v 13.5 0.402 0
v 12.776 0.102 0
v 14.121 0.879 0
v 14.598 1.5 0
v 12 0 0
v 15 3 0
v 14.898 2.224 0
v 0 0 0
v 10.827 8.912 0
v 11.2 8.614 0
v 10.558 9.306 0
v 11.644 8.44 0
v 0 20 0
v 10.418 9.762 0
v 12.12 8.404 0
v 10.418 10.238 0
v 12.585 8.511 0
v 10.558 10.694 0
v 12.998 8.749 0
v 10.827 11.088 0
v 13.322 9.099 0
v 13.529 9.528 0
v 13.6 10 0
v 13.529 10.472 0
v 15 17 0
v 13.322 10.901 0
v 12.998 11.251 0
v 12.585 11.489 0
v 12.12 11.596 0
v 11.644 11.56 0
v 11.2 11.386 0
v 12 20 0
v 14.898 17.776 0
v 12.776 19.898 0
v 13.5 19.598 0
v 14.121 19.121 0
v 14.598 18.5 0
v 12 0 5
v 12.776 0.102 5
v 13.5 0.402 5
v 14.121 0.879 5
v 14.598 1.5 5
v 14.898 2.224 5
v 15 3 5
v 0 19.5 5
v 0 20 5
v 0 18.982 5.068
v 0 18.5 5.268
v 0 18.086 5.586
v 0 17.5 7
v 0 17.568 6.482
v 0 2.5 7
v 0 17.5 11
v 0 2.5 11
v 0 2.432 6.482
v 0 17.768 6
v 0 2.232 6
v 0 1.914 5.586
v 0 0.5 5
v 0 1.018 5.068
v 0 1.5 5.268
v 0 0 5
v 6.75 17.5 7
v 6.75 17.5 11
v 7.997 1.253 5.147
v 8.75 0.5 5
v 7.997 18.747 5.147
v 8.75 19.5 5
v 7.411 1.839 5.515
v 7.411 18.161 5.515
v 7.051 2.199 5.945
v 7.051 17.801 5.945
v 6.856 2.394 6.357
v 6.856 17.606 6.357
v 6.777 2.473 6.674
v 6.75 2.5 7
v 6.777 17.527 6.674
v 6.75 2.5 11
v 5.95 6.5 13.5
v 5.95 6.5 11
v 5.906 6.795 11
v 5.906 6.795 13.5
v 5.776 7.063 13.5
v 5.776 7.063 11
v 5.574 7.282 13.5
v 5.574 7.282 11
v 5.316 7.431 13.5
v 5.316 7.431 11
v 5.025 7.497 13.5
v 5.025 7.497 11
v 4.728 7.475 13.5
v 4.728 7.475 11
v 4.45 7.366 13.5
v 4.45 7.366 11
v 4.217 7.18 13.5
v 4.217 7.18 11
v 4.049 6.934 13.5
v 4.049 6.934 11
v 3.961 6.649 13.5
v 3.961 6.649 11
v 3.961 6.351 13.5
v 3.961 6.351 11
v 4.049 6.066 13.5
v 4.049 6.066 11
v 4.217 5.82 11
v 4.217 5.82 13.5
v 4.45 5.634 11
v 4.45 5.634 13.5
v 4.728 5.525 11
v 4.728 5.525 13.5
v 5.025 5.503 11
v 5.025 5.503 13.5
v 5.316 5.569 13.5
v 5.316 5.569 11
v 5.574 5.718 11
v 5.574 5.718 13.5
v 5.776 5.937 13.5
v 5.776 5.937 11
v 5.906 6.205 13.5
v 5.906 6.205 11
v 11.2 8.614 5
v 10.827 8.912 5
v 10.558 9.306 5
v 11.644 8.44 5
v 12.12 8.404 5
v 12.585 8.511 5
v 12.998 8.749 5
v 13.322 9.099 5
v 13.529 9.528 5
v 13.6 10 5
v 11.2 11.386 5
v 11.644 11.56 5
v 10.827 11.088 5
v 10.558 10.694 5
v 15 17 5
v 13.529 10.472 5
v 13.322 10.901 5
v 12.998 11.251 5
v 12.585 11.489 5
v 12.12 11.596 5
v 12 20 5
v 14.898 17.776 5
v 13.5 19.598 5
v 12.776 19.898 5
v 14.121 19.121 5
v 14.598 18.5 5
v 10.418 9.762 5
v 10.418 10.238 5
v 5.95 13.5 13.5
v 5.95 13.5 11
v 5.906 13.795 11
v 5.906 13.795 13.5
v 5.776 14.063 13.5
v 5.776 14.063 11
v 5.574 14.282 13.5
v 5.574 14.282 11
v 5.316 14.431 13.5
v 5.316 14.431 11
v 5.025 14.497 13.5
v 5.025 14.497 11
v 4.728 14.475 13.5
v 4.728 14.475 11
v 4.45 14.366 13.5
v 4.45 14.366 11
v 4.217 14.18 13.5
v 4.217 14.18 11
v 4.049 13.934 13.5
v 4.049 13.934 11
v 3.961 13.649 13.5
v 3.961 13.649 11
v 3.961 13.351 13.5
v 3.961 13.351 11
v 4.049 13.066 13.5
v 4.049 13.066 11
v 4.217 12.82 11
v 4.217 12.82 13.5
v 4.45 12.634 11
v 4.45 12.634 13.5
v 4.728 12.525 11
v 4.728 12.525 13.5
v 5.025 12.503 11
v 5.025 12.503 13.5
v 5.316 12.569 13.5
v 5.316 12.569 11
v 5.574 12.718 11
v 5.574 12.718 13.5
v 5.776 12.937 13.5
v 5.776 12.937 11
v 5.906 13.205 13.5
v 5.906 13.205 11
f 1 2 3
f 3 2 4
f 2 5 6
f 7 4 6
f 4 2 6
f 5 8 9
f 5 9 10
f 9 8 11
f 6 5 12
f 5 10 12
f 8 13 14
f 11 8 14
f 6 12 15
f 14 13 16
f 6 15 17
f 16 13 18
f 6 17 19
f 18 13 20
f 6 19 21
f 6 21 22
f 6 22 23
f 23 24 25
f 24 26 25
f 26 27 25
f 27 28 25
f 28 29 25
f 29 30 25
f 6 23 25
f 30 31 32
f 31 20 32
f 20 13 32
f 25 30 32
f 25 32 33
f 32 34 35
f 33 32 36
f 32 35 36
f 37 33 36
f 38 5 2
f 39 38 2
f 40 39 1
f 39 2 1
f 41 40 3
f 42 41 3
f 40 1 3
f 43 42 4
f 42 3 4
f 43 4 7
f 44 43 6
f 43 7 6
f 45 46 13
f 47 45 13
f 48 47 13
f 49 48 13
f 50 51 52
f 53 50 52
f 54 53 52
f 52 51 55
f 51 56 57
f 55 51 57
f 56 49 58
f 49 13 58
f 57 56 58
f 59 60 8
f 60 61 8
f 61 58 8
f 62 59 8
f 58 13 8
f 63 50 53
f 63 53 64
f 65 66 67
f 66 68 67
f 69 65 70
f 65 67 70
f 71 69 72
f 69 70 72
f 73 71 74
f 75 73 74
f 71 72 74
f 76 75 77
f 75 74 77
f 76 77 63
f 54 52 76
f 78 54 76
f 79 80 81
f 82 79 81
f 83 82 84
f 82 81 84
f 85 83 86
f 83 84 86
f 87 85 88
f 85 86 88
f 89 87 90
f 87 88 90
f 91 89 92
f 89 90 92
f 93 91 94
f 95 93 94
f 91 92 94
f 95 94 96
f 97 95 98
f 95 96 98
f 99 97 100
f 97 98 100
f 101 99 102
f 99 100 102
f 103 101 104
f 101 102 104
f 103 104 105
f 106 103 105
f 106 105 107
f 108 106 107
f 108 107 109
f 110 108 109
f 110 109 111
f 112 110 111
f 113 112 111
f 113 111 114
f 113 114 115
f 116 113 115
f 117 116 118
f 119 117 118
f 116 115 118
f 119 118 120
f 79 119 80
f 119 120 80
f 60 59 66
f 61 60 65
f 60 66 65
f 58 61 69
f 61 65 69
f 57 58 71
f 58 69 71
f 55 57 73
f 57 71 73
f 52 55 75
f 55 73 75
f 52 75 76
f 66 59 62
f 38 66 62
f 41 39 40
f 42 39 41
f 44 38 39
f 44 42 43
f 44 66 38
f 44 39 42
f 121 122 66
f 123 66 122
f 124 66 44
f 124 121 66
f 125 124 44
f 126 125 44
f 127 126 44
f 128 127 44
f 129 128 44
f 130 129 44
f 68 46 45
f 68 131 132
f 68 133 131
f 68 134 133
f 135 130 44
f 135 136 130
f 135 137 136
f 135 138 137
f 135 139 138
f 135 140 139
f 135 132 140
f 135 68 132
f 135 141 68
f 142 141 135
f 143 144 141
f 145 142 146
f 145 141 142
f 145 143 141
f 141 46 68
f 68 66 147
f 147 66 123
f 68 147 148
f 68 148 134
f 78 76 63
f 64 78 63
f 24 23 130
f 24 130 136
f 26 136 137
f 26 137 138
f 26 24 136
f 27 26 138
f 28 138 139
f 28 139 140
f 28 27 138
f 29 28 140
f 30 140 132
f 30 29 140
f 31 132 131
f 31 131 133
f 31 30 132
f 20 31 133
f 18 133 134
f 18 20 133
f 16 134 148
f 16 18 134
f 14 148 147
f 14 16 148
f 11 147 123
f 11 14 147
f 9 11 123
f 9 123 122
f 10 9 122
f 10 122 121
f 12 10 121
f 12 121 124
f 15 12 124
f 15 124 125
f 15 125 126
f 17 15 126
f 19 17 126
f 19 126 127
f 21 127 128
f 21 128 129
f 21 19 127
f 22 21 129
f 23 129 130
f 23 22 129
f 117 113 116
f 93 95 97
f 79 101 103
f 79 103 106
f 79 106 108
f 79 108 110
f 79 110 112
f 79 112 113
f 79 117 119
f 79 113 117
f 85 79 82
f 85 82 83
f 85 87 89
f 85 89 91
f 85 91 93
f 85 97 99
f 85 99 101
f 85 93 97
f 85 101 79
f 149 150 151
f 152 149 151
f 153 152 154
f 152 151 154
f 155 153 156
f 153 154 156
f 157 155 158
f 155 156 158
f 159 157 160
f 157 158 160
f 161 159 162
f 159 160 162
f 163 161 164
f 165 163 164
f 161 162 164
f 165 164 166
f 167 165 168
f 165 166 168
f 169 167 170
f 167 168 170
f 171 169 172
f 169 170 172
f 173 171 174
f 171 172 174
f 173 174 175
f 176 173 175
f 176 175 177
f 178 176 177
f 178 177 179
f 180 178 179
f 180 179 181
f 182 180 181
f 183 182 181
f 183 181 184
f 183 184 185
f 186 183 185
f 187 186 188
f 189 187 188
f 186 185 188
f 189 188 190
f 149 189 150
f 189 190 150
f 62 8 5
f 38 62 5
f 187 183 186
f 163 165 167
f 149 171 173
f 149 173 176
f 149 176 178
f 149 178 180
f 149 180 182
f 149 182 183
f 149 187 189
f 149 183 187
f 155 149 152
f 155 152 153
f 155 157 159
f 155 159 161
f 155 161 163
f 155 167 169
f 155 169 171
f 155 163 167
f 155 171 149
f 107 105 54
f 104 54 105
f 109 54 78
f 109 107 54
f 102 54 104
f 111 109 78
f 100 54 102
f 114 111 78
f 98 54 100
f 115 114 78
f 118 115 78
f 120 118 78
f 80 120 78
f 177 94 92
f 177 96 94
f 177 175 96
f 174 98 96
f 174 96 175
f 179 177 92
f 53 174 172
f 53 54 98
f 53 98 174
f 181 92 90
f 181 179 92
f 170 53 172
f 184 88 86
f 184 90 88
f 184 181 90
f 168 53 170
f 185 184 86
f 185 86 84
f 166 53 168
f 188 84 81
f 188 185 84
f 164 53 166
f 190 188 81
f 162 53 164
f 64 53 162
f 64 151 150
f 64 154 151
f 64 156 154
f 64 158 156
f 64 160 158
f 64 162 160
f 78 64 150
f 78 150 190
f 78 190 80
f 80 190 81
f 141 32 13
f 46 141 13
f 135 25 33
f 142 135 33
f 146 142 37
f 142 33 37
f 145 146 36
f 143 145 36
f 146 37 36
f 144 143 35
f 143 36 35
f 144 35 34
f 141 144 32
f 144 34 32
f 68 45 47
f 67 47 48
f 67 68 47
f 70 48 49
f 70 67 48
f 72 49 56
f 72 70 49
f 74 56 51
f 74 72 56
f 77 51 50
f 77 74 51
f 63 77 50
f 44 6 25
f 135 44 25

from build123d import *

# Parameters (mm, degrees)
CROQUIS1_R              = 1.6
SALIENTE_EXTRUIR1_DEPTH = 5
CROQUIS2_W              = 6.75
CROQUIS2_H              = 15
SALIENTE_EXTRUIR2_DEPTH = 6
REDONDEO1_R             = 2
CROQUIS3_R              = 1
SALIENTE_EXTRUIR3_DEPTH = 2.5


with BuildPart() as part:
    # Croquis1 → Saliente-Extruir1 (new body)
    with BuildSketch(Plane.XY):
        with BuildLine():
            Line((0, 0), (12, 0))
            ThreePointArc((12, 0), (14.121320344, 0.878679656), (15, 3))
            Line((15, 3), (15, 17))
            ThreePointArc((15, 17), (14.121320344, 19.121320344), (12, 20))
            Line((12, 20), (0, 20))
            Line((0, 20), (0, 0))
        make_face()
        with Locations((12, 10)):
            Circle(CROQUIS1_R, mode=Mode.SUBTRACT)
    extrude(amount=SALIENTE_EXTRUIR1_DEPTH)

    # Croquis2 → Saliente-Extruir2 (add)
    with BuildSketch(Plane.XY.offset(5)):
        with Locations((3.375, 10)):
            Rectangle(CROQUIS2_W, CROQUIS2_H)
    extrude(amount=SALIENTE_EXTRUIR2_DEPTH)

    # Redondeo1
    redondeo1_edges = [part.edges().sort_by_distance(p)[0] for p in [
        (3.375, 2.5, 5),
        (6.75, 10, 5),
        (3.375, 17.5, 5),
    ]]
    fillet(redondeo1_edges, radius=REDONDEO1_R)

    # Croquis3 → Saliente-Extruir3 (add)
    with BuildSketch(Plane.XY.offset(11)):
        with Locations((4.95023571, 13.5)):
            Circle(CROQUIS3_R)
        with Locations((4.95023571, 6.5)):
            Circle(CROQUIS3_R)
    extrude(amount=SALIENTE_EXTRUIR3_DEPTH)


solid = part.part
